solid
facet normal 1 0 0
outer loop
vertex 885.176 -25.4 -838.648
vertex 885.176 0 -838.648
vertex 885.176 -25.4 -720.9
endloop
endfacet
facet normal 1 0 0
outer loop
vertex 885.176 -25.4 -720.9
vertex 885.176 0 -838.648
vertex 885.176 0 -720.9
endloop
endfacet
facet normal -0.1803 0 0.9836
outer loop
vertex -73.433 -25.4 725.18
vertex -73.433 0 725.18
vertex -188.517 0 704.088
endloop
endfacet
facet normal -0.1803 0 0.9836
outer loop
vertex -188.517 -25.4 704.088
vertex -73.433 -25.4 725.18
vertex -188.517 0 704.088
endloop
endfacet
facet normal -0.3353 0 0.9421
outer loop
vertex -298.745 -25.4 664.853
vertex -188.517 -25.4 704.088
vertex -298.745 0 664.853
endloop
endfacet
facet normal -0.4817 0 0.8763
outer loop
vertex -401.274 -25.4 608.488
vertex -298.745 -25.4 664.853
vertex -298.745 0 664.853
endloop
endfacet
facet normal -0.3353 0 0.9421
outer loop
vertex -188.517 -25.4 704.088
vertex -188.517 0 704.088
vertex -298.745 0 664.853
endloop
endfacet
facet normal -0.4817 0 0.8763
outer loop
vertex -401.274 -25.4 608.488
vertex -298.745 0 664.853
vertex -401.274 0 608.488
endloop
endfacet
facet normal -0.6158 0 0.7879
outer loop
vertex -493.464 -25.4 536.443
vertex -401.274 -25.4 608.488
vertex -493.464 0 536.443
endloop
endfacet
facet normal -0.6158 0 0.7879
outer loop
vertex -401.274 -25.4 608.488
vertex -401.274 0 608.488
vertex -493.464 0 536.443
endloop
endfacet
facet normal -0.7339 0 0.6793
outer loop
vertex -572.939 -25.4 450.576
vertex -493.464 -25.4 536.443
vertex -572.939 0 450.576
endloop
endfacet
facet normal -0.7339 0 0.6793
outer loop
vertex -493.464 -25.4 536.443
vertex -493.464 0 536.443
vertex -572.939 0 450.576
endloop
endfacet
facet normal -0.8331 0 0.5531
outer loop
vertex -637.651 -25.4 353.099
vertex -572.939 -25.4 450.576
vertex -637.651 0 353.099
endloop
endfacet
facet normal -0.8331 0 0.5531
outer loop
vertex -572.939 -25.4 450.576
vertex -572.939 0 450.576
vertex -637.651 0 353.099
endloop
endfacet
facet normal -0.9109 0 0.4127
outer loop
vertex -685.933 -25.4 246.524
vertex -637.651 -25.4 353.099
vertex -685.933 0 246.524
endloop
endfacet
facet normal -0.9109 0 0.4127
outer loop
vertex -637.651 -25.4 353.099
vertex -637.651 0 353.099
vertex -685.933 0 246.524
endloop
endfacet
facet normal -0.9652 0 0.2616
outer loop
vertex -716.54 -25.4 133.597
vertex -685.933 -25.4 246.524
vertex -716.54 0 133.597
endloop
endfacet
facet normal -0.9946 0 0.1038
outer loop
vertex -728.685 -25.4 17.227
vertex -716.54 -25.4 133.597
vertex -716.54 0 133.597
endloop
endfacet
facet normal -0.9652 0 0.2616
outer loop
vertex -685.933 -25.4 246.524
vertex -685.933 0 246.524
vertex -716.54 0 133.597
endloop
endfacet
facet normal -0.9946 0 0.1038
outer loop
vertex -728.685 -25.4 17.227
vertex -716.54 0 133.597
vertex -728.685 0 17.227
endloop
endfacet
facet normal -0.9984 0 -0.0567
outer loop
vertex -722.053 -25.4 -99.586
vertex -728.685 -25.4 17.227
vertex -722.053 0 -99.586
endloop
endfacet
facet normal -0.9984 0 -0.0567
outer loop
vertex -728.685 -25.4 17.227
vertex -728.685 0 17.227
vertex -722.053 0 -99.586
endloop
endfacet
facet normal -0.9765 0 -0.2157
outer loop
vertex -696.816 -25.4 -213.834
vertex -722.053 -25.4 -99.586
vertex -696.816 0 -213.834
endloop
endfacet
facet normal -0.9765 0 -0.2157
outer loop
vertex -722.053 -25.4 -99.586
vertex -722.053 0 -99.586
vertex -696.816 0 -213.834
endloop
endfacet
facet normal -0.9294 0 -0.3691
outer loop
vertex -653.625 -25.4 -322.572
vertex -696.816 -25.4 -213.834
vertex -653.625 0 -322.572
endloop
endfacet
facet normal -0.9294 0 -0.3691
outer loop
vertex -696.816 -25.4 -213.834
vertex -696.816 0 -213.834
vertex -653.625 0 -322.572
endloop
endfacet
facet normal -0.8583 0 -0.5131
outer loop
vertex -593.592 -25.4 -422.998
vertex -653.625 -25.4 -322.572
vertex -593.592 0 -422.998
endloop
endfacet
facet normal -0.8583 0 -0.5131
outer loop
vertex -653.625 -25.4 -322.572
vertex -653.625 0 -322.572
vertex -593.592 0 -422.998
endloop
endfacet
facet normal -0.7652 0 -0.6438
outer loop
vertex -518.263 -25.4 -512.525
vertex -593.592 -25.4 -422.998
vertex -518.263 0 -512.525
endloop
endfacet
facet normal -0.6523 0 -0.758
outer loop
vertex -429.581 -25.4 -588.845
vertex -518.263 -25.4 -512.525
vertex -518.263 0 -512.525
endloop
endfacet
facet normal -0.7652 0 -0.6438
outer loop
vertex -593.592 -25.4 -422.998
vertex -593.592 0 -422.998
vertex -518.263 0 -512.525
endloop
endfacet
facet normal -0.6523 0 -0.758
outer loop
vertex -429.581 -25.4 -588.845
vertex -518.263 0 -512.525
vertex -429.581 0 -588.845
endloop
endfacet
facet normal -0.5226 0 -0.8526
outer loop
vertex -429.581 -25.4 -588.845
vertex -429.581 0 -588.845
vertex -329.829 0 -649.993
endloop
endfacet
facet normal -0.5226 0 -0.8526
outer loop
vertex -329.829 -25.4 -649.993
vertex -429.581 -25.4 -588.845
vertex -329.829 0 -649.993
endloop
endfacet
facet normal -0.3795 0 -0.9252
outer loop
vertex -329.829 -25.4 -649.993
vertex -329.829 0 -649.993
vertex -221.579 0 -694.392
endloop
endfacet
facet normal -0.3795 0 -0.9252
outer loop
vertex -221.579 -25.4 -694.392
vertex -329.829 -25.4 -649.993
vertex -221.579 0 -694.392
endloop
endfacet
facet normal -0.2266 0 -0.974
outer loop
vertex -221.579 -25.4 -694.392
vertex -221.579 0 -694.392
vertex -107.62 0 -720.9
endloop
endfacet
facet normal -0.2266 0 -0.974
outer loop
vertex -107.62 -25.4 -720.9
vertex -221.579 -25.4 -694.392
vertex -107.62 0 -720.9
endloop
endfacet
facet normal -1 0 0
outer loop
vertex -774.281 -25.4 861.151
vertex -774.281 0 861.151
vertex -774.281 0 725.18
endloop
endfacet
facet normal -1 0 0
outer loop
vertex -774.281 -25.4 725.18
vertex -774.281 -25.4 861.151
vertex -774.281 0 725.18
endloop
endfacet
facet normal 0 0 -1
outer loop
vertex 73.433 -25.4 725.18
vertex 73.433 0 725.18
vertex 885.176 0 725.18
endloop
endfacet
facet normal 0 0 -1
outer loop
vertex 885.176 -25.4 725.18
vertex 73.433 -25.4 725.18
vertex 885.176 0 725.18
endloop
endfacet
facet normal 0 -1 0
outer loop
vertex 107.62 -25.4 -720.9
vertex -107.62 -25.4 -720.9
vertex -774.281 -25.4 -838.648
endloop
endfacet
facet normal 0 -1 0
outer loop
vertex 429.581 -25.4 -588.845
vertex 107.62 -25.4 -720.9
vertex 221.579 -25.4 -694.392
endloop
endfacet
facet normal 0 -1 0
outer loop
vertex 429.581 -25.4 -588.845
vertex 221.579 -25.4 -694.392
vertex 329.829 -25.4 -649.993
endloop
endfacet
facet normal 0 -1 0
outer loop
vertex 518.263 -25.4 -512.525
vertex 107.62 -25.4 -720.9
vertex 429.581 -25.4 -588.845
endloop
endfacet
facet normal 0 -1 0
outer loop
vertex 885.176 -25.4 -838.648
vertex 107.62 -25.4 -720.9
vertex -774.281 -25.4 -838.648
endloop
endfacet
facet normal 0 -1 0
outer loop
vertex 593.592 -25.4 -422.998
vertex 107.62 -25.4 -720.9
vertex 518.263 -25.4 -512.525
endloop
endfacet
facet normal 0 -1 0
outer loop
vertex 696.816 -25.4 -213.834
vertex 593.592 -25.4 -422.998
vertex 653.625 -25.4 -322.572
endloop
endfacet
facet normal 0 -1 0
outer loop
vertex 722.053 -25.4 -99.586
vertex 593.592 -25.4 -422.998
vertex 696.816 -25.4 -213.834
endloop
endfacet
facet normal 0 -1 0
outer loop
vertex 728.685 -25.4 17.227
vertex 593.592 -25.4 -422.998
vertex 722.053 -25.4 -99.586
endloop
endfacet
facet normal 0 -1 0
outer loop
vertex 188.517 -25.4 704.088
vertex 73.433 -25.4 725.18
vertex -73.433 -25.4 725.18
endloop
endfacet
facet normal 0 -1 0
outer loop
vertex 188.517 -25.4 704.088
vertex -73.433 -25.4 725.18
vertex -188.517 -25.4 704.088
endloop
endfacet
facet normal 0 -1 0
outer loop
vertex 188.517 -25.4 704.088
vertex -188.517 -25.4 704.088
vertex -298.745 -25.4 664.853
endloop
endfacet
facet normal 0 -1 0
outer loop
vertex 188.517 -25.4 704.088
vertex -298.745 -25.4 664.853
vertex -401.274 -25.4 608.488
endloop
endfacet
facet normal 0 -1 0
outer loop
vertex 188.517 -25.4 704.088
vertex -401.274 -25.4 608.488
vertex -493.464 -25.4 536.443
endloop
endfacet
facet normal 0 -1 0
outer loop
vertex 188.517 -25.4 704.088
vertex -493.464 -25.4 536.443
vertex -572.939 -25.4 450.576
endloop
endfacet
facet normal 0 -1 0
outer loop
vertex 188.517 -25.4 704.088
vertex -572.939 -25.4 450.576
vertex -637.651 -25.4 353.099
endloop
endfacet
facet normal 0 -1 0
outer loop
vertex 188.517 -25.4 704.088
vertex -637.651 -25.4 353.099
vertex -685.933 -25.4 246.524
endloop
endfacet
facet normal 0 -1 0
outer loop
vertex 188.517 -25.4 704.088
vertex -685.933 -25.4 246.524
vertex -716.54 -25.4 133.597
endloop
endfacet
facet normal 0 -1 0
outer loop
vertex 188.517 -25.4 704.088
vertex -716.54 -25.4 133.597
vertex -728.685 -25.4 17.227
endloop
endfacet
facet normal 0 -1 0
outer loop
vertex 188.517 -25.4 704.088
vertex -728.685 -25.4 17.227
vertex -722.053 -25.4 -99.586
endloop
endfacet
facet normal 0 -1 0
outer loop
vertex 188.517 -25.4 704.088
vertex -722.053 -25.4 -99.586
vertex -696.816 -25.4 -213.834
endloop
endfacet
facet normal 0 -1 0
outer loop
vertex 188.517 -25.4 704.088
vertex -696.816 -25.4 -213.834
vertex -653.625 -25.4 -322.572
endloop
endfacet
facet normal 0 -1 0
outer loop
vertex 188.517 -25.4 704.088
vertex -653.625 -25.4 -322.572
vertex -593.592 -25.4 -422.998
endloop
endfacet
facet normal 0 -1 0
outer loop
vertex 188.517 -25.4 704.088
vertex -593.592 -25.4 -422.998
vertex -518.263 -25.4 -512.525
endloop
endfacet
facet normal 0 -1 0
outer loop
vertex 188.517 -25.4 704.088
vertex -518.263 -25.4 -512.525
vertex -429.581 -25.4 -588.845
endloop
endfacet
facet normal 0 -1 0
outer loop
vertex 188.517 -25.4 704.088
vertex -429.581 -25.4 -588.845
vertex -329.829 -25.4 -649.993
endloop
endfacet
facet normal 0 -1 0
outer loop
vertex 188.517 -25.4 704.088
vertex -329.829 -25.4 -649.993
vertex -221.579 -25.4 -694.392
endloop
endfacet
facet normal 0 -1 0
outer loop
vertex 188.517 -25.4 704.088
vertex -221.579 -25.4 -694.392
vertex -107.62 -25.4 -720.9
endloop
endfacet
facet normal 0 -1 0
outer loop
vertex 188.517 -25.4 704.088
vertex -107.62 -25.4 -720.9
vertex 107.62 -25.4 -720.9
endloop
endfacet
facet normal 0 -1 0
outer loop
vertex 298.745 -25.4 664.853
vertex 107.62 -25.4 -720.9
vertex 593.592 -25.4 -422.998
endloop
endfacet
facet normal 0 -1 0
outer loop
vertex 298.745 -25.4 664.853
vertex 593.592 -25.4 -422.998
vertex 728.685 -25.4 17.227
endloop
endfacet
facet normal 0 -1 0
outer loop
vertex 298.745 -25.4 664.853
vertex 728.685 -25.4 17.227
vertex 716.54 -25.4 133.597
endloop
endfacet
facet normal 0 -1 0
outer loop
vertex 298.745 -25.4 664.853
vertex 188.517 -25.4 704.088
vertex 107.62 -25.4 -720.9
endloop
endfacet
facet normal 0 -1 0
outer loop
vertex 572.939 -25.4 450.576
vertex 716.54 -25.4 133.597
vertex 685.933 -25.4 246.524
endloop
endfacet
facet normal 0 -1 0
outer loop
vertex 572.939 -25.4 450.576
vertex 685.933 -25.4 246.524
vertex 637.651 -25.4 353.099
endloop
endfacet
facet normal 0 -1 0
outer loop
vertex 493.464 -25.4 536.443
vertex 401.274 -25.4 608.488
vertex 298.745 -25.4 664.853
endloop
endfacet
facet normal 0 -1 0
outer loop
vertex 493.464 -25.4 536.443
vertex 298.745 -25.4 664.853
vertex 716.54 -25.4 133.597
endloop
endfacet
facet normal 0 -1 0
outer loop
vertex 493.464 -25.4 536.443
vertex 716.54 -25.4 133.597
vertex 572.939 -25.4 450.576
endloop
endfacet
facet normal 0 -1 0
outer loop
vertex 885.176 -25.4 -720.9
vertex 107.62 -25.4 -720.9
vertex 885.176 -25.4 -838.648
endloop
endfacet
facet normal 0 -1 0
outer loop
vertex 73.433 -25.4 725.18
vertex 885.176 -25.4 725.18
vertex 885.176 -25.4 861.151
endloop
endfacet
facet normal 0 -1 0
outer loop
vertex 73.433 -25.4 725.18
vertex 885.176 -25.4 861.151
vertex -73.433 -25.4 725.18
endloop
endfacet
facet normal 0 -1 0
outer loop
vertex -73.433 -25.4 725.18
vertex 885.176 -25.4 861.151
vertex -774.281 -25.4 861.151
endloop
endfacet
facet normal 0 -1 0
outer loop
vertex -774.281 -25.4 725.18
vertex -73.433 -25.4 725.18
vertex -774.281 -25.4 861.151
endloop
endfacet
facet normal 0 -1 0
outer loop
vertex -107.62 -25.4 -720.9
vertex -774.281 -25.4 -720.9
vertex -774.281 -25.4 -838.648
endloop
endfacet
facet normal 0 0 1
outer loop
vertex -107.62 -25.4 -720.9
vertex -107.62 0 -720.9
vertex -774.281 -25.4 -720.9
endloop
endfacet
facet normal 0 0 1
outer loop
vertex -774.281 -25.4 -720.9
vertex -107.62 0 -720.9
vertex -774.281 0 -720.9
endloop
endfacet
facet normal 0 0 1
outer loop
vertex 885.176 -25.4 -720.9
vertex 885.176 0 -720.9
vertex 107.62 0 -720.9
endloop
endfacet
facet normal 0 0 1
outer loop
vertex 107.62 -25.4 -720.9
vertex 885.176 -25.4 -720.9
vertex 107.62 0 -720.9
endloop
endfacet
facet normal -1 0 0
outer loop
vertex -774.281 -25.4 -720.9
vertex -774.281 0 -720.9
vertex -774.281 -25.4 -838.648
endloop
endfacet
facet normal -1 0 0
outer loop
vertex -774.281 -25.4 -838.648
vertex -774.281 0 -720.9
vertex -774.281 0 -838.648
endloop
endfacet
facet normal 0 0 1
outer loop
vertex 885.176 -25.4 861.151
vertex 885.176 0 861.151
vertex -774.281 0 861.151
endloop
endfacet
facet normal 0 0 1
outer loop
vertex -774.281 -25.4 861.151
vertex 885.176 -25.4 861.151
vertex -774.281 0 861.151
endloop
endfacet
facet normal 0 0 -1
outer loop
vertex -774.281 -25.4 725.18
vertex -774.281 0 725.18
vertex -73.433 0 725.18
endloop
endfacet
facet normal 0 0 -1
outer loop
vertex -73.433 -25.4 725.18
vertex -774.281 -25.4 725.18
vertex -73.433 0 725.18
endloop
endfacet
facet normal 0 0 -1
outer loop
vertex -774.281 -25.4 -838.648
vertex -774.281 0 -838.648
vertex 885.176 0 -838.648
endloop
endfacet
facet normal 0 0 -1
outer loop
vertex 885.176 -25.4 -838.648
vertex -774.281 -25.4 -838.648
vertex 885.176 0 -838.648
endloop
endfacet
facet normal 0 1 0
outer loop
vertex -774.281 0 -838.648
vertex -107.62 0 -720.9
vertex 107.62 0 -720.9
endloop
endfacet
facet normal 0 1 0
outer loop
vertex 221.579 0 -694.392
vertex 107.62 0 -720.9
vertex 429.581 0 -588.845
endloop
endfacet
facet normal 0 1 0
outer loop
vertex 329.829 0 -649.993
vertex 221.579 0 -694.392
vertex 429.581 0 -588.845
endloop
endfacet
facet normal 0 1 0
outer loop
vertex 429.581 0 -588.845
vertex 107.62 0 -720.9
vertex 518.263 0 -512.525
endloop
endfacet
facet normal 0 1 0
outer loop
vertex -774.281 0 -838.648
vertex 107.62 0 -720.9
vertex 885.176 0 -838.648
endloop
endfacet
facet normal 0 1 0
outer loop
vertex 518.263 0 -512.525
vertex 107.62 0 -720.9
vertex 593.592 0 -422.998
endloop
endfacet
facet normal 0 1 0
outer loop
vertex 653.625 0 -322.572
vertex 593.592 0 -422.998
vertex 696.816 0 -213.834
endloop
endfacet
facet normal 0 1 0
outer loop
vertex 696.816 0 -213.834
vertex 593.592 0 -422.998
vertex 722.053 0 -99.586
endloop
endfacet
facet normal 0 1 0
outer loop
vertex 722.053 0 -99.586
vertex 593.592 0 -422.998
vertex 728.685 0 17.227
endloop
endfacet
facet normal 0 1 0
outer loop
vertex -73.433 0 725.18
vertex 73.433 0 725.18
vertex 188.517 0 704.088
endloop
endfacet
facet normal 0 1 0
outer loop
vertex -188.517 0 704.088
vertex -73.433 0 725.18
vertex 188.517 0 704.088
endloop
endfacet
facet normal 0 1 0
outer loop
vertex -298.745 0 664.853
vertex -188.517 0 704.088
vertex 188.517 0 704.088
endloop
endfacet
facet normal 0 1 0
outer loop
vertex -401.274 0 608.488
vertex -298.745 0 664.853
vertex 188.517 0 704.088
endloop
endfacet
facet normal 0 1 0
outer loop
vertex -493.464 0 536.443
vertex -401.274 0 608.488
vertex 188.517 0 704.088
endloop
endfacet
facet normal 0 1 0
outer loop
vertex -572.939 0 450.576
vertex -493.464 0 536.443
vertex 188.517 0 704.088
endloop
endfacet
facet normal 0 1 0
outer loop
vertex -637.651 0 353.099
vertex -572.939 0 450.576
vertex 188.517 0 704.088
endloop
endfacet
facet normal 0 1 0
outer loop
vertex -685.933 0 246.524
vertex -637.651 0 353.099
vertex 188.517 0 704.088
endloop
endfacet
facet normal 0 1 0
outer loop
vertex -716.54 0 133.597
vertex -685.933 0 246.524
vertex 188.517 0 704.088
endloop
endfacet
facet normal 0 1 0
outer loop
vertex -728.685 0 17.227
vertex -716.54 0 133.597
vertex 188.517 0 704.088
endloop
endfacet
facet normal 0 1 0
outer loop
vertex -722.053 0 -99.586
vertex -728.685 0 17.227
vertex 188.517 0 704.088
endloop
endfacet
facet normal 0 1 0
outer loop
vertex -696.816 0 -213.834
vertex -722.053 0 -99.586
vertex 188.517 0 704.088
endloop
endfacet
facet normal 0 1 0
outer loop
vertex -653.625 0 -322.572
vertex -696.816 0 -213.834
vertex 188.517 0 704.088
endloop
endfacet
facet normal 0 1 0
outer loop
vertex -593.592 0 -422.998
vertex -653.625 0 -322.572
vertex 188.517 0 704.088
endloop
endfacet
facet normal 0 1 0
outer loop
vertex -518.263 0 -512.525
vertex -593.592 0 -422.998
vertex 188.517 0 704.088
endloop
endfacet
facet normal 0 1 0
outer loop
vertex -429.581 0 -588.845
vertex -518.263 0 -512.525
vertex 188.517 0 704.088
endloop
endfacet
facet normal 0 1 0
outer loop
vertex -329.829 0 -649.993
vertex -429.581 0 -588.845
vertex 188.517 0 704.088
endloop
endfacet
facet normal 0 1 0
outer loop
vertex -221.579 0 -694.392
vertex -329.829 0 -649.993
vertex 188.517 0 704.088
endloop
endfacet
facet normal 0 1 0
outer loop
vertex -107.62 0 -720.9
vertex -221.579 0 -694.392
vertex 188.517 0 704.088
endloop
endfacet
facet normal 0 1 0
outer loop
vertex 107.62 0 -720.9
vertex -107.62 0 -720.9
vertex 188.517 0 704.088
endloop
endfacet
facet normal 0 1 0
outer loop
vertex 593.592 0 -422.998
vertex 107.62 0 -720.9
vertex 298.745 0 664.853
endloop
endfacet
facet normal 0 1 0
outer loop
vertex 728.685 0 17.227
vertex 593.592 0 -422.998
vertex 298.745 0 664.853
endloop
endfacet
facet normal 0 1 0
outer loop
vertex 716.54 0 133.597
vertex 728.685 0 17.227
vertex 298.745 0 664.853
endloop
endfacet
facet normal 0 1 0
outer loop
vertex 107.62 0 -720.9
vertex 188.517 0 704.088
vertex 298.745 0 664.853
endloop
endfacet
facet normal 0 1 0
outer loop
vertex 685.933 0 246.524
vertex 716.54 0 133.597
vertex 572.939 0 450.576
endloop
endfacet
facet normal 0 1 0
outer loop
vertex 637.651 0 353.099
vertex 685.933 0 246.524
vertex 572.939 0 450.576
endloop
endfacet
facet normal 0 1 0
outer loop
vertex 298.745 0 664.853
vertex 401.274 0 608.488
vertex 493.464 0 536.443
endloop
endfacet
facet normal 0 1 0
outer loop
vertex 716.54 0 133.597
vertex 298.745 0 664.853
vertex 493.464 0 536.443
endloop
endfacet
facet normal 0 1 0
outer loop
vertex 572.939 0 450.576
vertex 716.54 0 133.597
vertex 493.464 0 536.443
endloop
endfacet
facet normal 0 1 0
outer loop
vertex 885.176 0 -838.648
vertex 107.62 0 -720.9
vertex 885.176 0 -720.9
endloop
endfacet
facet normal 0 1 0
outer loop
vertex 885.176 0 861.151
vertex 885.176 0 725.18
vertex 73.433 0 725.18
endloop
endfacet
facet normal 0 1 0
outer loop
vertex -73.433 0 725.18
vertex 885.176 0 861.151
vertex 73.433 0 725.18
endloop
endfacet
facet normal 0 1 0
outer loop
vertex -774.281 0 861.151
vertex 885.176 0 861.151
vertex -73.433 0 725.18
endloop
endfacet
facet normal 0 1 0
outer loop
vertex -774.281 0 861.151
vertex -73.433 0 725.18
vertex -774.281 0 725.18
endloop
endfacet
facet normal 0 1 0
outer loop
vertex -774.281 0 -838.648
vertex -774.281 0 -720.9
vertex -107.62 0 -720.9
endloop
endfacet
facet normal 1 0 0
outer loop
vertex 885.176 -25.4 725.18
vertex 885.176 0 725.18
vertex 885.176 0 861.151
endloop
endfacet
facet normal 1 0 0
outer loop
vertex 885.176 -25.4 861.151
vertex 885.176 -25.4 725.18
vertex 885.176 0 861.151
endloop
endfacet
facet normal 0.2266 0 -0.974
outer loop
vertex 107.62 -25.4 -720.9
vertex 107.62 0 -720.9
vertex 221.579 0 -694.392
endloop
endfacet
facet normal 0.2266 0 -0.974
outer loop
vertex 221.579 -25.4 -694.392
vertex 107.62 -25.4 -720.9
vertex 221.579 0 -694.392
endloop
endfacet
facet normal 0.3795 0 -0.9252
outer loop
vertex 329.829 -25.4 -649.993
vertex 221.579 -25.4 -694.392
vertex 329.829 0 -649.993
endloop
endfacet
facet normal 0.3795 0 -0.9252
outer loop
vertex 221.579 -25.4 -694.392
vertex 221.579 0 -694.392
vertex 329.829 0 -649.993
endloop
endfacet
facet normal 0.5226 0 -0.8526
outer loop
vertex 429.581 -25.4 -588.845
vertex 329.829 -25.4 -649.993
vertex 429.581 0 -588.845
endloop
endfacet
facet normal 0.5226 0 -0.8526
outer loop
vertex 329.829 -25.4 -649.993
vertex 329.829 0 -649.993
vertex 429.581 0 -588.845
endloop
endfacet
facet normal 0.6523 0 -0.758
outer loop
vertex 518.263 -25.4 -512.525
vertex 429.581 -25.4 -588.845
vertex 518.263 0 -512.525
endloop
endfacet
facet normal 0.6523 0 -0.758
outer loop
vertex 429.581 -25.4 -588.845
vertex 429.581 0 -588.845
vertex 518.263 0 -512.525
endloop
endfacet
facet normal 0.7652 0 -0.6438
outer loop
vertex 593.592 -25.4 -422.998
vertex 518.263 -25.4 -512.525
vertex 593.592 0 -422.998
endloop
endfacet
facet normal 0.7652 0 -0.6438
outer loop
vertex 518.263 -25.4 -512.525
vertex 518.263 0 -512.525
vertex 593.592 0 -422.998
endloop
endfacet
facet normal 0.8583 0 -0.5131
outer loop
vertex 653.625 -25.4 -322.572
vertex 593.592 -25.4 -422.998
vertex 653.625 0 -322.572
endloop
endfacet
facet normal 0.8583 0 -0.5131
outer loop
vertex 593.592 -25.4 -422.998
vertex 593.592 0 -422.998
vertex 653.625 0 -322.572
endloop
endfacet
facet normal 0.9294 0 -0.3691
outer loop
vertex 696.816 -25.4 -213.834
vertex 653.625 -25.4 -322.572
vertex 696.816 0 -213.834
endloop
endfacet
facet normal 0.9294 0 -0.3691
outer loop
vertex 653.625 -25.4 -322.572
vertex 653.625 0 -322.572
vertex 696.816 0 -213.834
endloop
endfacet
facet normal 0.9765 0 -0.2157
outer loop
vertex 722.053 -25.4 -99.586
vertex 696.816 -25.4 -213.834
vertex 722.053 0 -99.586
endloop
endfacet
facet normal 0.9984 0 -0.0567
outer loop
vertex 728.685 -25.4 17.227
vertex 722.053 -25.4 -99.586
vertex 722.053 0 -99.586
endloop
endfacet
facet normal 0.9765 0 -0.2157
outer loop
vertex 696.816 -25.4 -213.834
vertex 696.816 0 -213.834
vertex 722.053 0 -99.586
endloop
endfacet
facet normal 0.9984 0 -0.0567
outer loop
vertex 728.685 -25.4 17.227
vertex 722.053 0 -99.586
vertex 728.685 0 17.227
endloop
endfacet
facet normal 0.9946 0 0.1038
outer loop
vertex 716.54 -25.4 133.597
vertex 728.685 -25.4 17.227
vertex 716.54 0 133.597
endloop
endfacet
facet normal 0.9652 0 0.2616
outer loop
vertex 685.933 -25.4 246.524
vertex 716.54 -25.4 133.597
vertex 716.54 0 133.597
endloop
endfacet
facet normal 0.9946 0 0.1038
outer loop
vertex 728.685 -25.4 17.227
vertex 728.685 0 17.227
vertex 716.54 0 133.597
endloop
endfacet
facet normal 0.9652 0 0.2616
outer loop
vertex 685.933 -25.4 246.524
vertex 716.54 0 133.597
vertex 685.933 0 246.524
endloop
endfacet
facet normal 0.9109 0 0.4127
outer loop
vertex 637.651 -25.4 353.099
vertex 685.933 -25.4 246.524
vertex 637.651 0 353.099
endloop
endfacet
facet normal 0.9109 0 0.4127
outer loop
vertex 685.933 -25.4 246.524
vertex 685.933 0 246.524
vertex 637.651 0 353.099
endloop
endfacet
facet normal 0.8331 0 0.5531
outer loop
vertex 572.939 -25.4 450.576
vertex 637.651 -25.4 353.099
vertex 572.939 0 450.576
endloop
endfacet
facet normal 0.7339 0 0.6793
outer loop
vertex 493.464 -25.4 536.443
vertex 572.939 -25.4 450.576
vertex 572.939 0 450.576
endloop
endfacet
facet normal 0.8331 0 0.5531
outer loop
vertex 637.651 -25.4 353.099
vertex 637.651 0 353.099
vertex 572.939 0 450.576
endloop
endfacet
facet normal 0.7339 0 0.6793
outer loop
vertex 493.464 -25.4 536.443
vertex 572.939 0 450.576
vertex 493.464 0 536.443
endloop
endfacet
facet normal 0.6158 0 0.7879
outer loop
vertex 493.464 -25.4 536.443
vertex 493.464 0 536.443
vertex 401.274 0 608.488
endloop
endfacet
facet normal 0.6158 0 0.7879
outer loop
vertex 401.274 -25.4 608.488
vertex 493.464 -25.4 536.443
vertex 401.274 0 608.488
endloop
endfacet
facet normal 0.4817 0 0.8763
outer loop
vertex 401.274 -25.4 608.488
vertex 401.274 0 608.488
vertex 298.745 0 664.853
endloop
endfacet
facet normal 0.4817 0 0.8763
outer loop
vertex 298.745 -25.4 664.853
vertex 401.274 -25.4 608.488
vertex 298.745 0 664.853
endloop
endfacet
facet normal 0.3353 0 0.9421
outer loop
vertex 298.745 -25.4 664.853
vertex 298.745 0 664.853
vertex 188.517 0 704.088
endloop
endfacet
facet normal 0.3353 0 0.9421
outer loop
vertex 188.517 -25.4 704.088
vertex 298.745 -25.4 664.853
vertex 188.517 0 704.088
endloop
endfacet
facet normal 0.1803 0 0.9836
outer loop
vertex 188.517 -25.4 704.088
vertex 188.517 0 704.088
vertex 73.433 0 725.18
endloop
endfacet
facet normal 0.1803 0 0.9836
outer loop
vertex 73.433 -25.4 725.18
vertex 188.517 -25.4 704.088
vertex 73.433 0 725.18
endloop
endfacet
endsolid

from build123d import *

# Parameters (mm, degrees)
F1_DEPTH = 25.4
F3_DEPTH = 25.4


# Not quite as in the source:
# - the program builds the solid bodies; features that only make, move or delete a surface that nothing else refers to are left out


with BuildPart() as f1:
    # F0 (on Front) → F1 (new body)
    with BuildSketch(Plane.XZ):
        with BuildLine():
            ThreePointArc((-73.432606987, 725.1798510551), (0, 728.8883070439), (73.432606987, 725.1798510551))
            Line((73.432606987, 725.1798510551), (885.1755261421, 725.1798510551))
            Line((885.1755261421, 725.1798510551), (885.1755261421, 861.151099205))
            Line((885.1755261421, 861.151099205), (-774.2805480957, 861.151099205))
            Line((-774.2805480957, 861.151099205), (-774.2805480957, 725.1798510551))
            Line((-774.2805480957, 725.1798510551), (-73.432606987, 725.1798510551))
        make_face()
    extrude(amount=F1_DEPTH)

    # F0 (on Front) → F3 (join)
    with BuildSketch(Plane.XZ):
        with BuildLine():
            ThreePointArc((107.6199000481, -720.8995223045), (552.1417620936, -475.8336250177), (728.8883070439, 0))
            ThreePointArc((728.8883070439, 0), (540.7413118737, 488.7504452974), (73.432606987, 725.1798510551))
            Line((73.432606987, 725.1798510551), (-73.432606987, 725.1798510551))
            ThreePointArc((-73.432606987, 725.1798510551), (-728.6846993659, 17.2271023467), (-107.6199000481, -720.8995223045))
            Line((-107.6199000481, -720.8995223045), (107.6199000481, -720.8995223045))
        make_face()
        with BuildLine():
            Line((-73.432606987, 725.1798510551), (73.432606987, 725.1798510551))
            ThreePointArc((73.432606987, 725.1798510551), (0, 728.8883070439), (-73.432606987, 725.1798510551))
        make_face()
        with BuildLine():
            ThreePointArc((-73.432606987, 725.1798510551), (0, 728.8883070439), (73.432606987, 725.1798510551))
            Line((73.432606987, 725.1798510551), (885.1755261421, 725.1798510551))
            Line((885.1755261421, 725.1798510551), (885.1755261421, 861.151099205))
            Line((885.1755261421, 861.151099205), (-774.2805480957, 861.151099205))
            Line((-774.2805480957, 861.151099205), (-774.2805480957, 725.1798510551))
            Line((-774.2805480957, 725.1798510551), (-73.432606987, 725.1798510551))
        make_face()
        with BuildLine():
            Line((885.1755261421, -720.8995223045), (107.6199000481, -720.8995223045))
            ThreePointArc((107.6199000481, -720.8995223045), (0, -728.8883070439), (-107.6199000481, -720.8995223045))
            Line((-107.6199000481, -720.8995223045), (-774.2805480957, -720.8995223045))
            Line((-774.2805480957, -720.8995223045), (-774.2805480957, -838.6484384537))
            Line((-774.2805480957, -838.6484384537), (885.1755261421, -838.6484384537))
            Line((885.1755261421, -838.6484384537), (885.1755261421, -720.8995223045))
        make_face()
        with BuildLine():
            ThreePointArc((-107.6199000481, -720.8995223045), (0, -728.8883070439), (107.6199000481, -720.8995223045))
            Line((107.6199000481, -720.8995223045), (-107.6199000481, -720.8995223045))
        make_face()
    extrude(amount=F3_DEPTH)


solid = f1.part
